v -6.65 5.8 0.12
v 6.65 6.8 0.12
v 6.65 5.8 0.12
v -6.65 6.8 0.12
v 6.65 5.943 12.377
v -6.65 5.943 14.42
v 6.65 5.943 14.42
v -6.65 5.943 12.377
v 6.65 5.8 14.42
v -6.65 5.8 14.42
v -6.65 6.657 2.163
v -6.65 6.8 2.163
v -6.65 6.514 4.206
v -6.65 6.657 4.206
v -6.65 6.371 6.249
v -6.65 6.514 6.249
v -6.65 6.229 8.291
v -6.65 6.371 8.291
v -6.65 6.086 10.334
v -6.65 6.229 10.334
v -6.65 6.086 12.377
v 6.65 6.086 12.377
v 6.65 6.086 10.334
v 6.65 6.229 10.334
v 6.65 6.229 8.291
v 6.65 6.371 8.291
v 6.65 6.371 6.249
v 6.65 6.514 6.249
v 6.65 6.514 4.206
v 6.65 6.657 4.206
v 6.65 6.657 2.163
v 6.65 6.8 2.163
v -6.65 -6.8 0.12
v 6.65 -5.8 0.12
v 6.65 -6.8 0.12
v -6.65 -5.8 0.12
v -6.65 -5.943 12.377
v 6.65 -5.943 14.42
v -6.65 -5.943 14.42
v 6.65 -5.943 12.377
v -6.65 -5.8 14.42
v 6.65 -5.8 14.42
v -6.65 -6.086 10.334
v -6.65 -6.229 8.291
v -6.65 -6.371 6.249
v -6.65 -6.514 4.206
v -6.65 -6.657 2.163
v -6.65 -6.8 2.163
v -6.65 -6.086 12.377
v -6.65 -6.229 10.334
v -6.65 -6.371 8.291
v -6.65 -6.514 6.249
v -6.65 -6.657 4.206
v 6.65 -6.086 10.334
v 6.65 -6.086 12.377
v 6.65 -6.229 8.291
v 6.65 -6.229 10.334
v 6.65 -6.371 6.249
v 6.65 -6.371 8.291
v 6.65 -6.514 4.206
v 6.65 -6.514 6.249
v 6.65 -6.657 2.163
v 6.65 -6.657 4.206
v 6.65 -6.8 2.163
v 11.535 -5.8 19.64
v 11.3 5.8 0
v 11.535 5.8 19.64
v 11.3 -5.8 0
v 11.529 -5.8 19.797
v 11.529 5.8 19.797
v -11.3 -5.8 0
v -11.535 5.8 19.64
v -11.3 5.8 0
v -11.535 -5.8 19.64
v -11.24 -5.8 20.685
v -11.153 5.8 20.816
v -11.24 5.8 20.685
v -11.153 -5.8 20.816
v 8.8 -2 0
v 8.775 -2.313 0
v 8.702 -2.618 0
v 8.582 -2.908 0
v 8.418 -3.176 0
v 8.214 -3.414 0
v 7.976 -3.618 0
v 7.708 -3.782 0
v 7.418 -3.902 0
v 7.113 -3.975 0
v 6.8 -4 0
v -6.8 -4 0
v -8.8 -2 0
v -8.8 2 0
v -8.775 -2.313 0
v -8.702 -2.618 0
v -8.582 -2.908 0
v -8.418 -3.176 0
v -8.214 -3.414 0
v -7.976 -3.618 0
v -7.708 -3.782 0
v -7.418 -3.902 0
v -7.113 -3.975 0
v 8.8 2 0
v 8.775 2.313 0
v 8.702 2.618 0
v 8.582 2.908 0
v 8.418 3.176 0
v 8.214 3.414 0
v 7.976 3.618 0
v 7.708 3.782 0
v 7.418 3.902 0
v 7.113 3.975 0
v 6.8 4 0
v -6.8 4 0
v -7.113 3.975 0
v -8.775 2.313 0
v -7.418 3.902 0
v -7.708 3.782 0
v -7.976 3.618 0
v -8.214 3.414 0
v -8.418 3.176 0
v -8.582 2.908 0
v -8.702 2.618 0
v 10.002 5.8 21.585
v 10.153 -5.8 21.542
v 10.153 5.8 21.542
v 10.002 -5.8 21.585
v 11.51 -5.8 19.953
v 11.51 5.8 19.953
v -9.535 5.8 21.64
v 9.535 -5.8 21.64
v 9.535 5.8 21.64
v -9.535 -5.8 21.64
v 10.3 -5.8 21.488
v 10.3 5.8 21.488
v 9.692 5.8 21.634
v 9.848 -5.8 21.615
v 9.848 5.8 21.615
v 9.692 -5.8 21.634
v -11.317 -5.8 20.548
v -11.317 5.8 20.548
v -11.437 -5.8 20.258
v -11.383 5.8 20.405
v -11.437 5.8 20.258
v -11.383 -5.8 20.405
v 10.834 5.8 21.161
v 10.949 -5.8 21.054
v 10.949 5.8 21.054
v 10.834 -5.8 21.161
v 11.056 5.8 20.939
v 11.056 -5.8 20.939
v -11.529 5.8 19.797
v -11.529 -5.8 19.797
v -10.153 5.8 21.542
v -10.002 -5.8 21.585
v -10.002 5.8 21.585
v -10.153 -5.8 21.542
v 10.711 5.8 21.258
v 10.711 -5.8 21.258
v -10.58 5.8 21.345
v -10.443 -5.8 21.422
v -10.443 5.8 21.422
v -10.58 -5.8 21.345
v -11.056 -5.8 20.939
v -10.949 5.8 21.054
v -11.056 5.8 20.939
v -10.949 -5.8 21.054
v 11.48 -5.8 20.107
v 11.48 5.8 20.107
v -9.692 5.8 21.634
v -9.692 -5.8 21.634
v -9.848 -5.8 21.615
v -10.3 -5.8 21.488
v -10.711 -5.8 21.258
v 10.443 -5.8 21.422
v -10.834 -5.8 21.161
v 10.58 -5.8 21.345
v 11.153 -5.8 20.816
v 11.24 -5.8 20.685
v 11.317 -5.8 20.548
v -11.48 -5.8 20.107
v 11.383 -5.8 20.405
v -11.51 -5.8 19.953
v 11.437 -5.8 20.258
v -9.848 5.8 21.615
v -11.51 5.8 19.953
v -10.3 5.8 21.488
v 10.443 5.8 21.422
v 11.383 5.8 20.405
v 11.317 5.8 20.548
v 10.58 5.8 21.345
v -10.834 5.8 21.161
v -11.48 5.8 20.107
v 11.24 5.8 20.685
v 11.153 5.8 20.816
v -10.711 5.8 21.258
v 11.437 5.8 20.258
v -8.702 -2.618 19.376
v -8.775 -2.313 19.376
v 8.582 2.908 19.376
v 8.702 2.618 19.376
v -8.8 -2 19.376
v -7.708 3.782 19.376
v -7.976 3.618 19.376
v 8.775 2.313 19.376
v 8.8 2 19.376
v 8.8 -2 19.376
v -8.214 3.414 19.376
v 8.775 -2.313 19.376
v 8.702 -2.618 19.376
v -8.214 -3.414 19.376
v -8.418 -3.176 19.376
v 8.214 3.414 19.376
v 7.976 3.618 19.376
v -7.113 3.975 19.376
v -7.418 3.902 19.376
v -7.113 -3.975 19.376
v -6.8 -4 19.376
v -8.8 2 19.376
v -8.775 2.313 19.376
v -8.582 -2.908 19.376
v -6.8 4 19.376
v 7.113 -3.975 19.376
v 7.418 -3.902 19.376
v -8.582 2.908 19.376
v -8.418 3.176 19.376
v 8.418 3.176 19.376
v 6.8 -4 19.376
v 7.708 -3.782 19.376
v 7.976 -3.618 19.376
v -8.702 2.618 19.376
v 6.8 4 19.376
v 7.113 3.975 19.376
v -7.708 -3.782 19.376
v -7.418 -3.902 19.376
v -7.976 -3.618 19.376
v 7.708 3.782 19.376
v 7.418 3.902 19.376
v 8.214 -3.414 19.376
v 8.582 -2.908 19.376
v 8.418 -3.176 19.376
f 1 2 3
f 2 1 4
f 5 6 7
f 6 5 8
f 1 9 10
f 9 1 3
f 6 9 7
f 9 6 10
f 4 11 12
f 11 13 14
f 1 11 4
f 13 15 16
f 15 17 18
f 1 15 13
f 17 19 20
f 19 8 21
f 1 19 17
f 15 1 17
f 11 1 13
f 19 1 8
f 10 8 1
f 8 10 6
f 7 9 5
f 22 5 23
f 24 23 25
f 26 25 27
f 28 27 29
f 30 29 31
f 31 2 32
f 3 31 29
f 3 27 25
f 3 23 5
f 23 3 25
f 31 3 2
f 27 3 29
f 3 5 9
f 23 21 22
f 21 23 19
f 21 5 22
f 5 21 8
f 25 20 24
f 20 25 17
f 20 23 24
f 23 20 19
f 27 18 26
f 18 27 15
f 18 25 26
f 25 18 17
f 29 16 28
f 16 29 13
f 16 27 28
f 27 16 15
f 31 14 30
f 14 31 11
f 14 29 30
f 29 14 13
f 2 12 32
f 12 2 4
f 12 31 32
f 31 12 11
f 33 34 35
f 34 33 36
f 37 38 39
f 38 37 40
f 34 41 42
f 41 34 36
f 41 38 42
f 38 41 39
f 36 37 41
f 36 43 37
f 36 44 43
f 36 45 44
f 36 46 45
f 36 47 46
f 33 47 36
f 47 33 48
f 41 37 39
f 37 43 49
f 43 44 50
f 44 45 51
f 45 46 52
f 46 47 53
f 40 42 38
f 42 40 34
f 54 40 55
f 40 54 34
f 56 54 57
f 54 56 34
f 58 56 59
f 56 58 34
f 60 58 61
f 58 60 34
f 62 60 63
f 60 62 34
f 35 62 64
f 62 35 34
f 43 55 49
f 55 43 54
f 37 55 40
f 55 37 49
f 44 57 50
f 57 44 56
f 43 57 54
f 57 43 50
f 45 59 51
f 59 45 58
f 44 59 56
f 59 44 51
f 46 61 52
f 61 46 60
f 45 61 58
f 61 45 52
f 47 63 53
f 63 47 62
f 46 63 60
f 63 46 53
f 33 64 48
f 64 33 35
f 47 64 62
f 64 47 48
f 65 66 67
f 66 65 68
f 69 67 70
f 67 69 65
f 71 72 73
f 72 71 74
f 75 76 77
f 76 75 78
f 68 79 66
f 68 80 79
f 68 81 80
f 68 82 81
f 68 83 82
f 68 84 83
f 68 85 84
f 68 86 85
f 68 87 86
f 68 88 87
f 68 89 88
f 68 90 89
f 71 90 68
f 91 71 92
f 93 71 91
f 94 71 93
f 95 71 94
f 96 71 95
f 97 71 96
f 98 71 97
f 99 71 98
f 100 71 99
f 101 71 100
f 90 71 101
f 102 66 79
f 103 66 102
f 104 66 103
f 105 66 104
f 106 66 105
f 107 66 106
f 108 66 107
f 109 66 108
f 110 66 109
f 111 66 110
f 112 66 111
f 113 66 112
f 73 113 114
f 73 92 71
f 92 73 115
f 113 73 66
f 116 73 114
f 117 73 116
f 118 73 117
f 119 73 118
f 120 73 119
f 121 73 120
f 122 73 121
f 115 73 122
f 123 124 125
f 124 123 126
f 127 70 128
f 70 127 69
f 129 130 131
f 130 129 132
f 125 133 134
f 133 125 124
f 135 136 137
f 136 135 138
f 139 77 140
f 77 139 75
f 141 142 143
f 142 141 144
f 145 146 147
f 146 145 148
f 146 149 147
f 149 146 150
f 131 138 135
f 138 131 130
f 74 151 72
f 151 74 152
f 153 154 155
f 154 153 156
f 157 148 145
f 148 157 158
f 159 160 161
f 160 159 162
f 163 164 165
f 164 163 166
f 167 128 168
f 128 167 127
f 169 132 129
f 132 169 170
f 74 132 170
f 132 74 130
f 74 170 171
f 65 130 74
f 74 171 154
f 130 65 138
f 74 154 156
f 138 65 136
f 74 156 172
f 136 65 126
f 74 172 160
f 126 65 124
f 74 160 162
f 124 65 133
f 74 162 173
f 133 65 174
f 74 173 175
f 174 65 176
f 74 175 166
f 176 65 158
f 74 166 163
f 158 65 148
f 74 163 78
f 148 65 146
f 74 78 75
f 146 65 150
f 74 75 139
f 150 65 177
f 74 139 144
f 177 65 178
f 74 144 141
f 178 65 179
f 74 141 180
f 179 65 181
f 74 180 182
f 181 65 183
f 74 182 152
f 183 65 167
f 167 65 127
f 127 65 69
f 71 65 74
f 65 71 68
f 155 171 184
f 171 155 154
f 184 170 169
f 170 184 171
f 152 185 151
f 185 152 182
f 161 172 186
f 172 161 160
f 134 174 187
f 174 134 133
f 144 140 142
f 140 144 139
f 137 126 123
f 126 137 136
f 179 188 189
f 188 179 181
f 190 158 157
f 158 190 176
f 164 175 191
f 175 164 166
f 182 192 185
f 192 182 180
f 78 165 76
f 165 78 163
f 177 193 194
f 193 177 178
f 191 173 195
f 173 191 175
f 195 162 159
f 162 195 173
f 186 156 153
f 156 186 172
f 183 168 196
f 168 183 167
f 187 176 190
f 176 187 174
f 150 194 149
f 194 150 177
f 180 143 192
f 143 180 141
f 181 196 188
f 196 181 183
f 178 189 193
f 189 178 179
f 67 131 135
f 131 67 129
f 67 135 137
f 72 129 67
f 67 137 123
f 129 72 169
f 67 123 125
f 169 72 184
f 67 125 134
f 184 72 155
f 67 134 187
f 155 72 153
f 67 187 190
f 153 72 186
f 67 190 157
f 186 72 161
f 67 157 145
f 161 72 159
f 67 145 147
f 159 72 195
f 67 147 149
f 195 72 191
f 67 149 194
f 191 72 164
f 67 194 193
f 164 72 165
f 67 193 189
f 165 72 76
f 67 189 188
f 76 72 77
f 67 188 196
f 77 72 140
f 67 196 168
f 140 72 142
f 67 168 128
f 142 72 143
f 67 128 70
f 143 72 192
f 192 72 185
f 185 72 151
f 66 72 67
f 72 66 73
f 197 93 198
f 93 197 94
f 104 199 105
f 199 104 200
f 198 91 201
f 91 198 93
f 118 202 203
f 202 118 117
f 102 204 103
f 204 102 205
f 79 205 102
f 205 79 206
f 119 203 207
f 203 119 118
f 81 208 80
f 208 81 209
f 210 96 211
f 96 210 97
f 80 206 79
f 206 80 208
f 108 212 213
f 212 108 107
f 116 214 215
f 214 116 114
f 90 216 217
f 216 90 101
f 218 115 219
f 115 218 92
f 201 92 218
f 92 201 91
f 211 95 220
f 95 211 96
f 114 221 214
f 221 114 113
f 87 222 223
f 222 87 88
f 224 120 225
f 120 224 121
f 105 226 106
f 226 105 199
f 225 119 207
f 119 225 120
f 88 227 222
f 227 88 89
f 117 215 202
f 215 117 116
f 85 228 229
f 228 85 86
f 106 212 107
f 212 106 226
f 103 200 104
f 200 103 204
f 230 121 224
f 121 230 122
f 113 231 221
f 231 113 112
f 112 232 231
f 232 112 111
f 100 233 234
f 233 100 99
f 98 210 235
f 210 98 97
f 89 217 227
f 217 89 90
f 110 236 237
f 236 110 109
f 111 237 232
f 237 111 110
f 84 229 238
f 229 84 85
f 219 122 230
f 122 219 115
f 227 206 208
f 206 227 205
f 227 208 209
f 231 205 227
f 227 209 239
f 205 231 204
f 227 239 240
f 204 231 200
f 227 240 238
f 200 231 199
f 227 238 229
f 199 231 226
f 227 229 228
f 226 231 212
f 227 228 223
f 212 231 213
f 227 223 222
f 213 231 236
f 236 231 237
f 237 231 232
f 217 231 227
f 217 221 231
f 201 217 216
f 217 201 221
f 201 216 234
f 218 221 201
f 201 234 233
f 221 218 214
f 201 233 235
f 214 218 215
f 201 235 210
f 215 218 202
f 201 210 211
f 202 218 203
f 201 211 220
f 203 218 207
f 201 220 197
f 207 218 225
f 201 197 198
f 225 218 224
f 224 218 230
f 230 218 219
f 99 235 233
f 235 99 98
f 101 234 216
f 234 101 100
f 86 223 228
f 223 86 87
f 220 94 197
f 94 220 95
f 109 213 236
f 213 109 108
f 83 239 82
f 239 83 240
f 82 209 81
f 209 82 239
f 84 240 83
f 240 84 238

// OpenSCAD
/**
 * Module: The ATM fuse holder cap
 *
 * Author: Karim Aziiev <karim.aziiev@gmail.com>
 * License: GPL-3.0-or-later
 */

include <../../colors.scad>
include <../../parameters.scad>

use <../../lib/plist.scad>
use <../../lib/slots.scad>
use <../../lib/stairs.scad>
use <../../lib/transforms.scad>
use <../../lib/trapezoids.scad>

module atm_fuse_holder_cap(size=[atm_fuse_holder_cap_top_l,
                                 atm_fuse_holder_cap_thickness,
                                 atm_fuse_holder_cap_h,
                                 atm_fuse_holder_cap_bottom_l],
                           rib=plist_get("rib", plist_get("cap", atm_fuse_default_plist)),
                           round_side="top",
                           corner_rad=2,
                           hole_size,
                           color=matte_black_2) {

  assert(plist_is(rib) && len(rib) > 0, "Supply a cap-rib specification");

  rib_colr = plist_get("color", rib, matte_black);
  rib_thickness = plist_get("thickness",
                            rib,
                            atm_fuse_holder_cap_rib_thickness);

  hole_size = with_default(atm_fuse_holder_cap_hole_size, []);

  thickness = size[1];
  w = size[0] - rib_thickness * 2;
  h = size[2];

  rib_h = plist_get("h", rib, atm_fuse_holder_cap_rib_h);
  rib_l = plist_get("l", rib, atm_fuse_holder_cap_rib_l);
  rib_n = plist_get("n", rib, atm_fuse_holder_cap_rib_n);

  rib_distance = plist_get("distance_from_top", rib, 0);

  difference() {
    union() {
      color(color, alpha=1) {
        trapezoid_vertical(size=[w, thickness, h, size[3]],
                           r=corner_rad,
                           round_side=round_side);
      }

      color(rib_colr, alpha=1) {
        mirror_copy([0, 1, 0]) {
          let (max_rib_dist = h - rib_h) {
            translate([0,
                       thickness / 2,
                       h - rib_h / 2 - min(max_rib_dist, rib_distance)]) {
              rotate([0, 90, 90]) {
                stairs_solid(total_size=[rib_h,
                                         rib_l,
                                         rib_thickness],
                             step_count=rib_n);
              }
            }
          }
        }
      }
    }
    translate([0, 0, -0.2]) {
      rect_slot(h=h * 0.9,
                r=corner_rad,
                reverse=true,
                size=hole_size,
                center=true);
    }
  }
}

module atm_fuse_holder_cap_from_plist(plist=plist_get("cap", atm_fuse_default_plist)) {
  assert(plist_is(plist) && len(plist) > 0,
         "Supply a fuse-holder cap specification");
  size = plist_get("size",
                   plist,
                   [atm_fuse_holder_cap_top_l,
                    atm_fuse_holder_cap_thickness,
                    atm_fuse_holder_cap_h,
                    atm_fuse_holder_cap_bottom_l]);
  rib = plist_get("rib", plist);
  round_side = plist_get("round_side", plist, "top");
  corner_rad = plist_get("corner_rad", plist, 2);
  cap_hole_size = plist_get("hole_size", plist);
  color = plist_get("color", plist, matte_black_2);

  atm_fuse_holder_cap(size=size,
                      rib=rib,
                      round_side=round_side,
                      corner_rad=corner_rad,
                      hole_size=cap_hole_size,
                      color=color);
}

atm_fuse_holder_cap_from_plist(["size", [atm_fuse_holder_cap_top_l,
                                         atm_fuse_holder_cap_thickness,
                                         atm_fuse_holder_cap_h,
                                         atm_fuse_holder_cap_bottom_l,],
                                "corner_rad", 2,
                                "round_side", "top",
                                "hole_size", atm_fuse_holder_cap_hole_size,
                                "color", matte_black_2,
                                "rib", ["h", atm_fuse_holder_cap_rib_h,
                                        "l", atm_fuse_holder_cap_rib_l,
                                        "n", atm_fuse_holder_cap_rib_n,
                                        "thickness", atm_fuse_holder_cap_rib_thickness,
                                        "distance_from_top", atm_fuse_holder_cap_rib_distance]]);
